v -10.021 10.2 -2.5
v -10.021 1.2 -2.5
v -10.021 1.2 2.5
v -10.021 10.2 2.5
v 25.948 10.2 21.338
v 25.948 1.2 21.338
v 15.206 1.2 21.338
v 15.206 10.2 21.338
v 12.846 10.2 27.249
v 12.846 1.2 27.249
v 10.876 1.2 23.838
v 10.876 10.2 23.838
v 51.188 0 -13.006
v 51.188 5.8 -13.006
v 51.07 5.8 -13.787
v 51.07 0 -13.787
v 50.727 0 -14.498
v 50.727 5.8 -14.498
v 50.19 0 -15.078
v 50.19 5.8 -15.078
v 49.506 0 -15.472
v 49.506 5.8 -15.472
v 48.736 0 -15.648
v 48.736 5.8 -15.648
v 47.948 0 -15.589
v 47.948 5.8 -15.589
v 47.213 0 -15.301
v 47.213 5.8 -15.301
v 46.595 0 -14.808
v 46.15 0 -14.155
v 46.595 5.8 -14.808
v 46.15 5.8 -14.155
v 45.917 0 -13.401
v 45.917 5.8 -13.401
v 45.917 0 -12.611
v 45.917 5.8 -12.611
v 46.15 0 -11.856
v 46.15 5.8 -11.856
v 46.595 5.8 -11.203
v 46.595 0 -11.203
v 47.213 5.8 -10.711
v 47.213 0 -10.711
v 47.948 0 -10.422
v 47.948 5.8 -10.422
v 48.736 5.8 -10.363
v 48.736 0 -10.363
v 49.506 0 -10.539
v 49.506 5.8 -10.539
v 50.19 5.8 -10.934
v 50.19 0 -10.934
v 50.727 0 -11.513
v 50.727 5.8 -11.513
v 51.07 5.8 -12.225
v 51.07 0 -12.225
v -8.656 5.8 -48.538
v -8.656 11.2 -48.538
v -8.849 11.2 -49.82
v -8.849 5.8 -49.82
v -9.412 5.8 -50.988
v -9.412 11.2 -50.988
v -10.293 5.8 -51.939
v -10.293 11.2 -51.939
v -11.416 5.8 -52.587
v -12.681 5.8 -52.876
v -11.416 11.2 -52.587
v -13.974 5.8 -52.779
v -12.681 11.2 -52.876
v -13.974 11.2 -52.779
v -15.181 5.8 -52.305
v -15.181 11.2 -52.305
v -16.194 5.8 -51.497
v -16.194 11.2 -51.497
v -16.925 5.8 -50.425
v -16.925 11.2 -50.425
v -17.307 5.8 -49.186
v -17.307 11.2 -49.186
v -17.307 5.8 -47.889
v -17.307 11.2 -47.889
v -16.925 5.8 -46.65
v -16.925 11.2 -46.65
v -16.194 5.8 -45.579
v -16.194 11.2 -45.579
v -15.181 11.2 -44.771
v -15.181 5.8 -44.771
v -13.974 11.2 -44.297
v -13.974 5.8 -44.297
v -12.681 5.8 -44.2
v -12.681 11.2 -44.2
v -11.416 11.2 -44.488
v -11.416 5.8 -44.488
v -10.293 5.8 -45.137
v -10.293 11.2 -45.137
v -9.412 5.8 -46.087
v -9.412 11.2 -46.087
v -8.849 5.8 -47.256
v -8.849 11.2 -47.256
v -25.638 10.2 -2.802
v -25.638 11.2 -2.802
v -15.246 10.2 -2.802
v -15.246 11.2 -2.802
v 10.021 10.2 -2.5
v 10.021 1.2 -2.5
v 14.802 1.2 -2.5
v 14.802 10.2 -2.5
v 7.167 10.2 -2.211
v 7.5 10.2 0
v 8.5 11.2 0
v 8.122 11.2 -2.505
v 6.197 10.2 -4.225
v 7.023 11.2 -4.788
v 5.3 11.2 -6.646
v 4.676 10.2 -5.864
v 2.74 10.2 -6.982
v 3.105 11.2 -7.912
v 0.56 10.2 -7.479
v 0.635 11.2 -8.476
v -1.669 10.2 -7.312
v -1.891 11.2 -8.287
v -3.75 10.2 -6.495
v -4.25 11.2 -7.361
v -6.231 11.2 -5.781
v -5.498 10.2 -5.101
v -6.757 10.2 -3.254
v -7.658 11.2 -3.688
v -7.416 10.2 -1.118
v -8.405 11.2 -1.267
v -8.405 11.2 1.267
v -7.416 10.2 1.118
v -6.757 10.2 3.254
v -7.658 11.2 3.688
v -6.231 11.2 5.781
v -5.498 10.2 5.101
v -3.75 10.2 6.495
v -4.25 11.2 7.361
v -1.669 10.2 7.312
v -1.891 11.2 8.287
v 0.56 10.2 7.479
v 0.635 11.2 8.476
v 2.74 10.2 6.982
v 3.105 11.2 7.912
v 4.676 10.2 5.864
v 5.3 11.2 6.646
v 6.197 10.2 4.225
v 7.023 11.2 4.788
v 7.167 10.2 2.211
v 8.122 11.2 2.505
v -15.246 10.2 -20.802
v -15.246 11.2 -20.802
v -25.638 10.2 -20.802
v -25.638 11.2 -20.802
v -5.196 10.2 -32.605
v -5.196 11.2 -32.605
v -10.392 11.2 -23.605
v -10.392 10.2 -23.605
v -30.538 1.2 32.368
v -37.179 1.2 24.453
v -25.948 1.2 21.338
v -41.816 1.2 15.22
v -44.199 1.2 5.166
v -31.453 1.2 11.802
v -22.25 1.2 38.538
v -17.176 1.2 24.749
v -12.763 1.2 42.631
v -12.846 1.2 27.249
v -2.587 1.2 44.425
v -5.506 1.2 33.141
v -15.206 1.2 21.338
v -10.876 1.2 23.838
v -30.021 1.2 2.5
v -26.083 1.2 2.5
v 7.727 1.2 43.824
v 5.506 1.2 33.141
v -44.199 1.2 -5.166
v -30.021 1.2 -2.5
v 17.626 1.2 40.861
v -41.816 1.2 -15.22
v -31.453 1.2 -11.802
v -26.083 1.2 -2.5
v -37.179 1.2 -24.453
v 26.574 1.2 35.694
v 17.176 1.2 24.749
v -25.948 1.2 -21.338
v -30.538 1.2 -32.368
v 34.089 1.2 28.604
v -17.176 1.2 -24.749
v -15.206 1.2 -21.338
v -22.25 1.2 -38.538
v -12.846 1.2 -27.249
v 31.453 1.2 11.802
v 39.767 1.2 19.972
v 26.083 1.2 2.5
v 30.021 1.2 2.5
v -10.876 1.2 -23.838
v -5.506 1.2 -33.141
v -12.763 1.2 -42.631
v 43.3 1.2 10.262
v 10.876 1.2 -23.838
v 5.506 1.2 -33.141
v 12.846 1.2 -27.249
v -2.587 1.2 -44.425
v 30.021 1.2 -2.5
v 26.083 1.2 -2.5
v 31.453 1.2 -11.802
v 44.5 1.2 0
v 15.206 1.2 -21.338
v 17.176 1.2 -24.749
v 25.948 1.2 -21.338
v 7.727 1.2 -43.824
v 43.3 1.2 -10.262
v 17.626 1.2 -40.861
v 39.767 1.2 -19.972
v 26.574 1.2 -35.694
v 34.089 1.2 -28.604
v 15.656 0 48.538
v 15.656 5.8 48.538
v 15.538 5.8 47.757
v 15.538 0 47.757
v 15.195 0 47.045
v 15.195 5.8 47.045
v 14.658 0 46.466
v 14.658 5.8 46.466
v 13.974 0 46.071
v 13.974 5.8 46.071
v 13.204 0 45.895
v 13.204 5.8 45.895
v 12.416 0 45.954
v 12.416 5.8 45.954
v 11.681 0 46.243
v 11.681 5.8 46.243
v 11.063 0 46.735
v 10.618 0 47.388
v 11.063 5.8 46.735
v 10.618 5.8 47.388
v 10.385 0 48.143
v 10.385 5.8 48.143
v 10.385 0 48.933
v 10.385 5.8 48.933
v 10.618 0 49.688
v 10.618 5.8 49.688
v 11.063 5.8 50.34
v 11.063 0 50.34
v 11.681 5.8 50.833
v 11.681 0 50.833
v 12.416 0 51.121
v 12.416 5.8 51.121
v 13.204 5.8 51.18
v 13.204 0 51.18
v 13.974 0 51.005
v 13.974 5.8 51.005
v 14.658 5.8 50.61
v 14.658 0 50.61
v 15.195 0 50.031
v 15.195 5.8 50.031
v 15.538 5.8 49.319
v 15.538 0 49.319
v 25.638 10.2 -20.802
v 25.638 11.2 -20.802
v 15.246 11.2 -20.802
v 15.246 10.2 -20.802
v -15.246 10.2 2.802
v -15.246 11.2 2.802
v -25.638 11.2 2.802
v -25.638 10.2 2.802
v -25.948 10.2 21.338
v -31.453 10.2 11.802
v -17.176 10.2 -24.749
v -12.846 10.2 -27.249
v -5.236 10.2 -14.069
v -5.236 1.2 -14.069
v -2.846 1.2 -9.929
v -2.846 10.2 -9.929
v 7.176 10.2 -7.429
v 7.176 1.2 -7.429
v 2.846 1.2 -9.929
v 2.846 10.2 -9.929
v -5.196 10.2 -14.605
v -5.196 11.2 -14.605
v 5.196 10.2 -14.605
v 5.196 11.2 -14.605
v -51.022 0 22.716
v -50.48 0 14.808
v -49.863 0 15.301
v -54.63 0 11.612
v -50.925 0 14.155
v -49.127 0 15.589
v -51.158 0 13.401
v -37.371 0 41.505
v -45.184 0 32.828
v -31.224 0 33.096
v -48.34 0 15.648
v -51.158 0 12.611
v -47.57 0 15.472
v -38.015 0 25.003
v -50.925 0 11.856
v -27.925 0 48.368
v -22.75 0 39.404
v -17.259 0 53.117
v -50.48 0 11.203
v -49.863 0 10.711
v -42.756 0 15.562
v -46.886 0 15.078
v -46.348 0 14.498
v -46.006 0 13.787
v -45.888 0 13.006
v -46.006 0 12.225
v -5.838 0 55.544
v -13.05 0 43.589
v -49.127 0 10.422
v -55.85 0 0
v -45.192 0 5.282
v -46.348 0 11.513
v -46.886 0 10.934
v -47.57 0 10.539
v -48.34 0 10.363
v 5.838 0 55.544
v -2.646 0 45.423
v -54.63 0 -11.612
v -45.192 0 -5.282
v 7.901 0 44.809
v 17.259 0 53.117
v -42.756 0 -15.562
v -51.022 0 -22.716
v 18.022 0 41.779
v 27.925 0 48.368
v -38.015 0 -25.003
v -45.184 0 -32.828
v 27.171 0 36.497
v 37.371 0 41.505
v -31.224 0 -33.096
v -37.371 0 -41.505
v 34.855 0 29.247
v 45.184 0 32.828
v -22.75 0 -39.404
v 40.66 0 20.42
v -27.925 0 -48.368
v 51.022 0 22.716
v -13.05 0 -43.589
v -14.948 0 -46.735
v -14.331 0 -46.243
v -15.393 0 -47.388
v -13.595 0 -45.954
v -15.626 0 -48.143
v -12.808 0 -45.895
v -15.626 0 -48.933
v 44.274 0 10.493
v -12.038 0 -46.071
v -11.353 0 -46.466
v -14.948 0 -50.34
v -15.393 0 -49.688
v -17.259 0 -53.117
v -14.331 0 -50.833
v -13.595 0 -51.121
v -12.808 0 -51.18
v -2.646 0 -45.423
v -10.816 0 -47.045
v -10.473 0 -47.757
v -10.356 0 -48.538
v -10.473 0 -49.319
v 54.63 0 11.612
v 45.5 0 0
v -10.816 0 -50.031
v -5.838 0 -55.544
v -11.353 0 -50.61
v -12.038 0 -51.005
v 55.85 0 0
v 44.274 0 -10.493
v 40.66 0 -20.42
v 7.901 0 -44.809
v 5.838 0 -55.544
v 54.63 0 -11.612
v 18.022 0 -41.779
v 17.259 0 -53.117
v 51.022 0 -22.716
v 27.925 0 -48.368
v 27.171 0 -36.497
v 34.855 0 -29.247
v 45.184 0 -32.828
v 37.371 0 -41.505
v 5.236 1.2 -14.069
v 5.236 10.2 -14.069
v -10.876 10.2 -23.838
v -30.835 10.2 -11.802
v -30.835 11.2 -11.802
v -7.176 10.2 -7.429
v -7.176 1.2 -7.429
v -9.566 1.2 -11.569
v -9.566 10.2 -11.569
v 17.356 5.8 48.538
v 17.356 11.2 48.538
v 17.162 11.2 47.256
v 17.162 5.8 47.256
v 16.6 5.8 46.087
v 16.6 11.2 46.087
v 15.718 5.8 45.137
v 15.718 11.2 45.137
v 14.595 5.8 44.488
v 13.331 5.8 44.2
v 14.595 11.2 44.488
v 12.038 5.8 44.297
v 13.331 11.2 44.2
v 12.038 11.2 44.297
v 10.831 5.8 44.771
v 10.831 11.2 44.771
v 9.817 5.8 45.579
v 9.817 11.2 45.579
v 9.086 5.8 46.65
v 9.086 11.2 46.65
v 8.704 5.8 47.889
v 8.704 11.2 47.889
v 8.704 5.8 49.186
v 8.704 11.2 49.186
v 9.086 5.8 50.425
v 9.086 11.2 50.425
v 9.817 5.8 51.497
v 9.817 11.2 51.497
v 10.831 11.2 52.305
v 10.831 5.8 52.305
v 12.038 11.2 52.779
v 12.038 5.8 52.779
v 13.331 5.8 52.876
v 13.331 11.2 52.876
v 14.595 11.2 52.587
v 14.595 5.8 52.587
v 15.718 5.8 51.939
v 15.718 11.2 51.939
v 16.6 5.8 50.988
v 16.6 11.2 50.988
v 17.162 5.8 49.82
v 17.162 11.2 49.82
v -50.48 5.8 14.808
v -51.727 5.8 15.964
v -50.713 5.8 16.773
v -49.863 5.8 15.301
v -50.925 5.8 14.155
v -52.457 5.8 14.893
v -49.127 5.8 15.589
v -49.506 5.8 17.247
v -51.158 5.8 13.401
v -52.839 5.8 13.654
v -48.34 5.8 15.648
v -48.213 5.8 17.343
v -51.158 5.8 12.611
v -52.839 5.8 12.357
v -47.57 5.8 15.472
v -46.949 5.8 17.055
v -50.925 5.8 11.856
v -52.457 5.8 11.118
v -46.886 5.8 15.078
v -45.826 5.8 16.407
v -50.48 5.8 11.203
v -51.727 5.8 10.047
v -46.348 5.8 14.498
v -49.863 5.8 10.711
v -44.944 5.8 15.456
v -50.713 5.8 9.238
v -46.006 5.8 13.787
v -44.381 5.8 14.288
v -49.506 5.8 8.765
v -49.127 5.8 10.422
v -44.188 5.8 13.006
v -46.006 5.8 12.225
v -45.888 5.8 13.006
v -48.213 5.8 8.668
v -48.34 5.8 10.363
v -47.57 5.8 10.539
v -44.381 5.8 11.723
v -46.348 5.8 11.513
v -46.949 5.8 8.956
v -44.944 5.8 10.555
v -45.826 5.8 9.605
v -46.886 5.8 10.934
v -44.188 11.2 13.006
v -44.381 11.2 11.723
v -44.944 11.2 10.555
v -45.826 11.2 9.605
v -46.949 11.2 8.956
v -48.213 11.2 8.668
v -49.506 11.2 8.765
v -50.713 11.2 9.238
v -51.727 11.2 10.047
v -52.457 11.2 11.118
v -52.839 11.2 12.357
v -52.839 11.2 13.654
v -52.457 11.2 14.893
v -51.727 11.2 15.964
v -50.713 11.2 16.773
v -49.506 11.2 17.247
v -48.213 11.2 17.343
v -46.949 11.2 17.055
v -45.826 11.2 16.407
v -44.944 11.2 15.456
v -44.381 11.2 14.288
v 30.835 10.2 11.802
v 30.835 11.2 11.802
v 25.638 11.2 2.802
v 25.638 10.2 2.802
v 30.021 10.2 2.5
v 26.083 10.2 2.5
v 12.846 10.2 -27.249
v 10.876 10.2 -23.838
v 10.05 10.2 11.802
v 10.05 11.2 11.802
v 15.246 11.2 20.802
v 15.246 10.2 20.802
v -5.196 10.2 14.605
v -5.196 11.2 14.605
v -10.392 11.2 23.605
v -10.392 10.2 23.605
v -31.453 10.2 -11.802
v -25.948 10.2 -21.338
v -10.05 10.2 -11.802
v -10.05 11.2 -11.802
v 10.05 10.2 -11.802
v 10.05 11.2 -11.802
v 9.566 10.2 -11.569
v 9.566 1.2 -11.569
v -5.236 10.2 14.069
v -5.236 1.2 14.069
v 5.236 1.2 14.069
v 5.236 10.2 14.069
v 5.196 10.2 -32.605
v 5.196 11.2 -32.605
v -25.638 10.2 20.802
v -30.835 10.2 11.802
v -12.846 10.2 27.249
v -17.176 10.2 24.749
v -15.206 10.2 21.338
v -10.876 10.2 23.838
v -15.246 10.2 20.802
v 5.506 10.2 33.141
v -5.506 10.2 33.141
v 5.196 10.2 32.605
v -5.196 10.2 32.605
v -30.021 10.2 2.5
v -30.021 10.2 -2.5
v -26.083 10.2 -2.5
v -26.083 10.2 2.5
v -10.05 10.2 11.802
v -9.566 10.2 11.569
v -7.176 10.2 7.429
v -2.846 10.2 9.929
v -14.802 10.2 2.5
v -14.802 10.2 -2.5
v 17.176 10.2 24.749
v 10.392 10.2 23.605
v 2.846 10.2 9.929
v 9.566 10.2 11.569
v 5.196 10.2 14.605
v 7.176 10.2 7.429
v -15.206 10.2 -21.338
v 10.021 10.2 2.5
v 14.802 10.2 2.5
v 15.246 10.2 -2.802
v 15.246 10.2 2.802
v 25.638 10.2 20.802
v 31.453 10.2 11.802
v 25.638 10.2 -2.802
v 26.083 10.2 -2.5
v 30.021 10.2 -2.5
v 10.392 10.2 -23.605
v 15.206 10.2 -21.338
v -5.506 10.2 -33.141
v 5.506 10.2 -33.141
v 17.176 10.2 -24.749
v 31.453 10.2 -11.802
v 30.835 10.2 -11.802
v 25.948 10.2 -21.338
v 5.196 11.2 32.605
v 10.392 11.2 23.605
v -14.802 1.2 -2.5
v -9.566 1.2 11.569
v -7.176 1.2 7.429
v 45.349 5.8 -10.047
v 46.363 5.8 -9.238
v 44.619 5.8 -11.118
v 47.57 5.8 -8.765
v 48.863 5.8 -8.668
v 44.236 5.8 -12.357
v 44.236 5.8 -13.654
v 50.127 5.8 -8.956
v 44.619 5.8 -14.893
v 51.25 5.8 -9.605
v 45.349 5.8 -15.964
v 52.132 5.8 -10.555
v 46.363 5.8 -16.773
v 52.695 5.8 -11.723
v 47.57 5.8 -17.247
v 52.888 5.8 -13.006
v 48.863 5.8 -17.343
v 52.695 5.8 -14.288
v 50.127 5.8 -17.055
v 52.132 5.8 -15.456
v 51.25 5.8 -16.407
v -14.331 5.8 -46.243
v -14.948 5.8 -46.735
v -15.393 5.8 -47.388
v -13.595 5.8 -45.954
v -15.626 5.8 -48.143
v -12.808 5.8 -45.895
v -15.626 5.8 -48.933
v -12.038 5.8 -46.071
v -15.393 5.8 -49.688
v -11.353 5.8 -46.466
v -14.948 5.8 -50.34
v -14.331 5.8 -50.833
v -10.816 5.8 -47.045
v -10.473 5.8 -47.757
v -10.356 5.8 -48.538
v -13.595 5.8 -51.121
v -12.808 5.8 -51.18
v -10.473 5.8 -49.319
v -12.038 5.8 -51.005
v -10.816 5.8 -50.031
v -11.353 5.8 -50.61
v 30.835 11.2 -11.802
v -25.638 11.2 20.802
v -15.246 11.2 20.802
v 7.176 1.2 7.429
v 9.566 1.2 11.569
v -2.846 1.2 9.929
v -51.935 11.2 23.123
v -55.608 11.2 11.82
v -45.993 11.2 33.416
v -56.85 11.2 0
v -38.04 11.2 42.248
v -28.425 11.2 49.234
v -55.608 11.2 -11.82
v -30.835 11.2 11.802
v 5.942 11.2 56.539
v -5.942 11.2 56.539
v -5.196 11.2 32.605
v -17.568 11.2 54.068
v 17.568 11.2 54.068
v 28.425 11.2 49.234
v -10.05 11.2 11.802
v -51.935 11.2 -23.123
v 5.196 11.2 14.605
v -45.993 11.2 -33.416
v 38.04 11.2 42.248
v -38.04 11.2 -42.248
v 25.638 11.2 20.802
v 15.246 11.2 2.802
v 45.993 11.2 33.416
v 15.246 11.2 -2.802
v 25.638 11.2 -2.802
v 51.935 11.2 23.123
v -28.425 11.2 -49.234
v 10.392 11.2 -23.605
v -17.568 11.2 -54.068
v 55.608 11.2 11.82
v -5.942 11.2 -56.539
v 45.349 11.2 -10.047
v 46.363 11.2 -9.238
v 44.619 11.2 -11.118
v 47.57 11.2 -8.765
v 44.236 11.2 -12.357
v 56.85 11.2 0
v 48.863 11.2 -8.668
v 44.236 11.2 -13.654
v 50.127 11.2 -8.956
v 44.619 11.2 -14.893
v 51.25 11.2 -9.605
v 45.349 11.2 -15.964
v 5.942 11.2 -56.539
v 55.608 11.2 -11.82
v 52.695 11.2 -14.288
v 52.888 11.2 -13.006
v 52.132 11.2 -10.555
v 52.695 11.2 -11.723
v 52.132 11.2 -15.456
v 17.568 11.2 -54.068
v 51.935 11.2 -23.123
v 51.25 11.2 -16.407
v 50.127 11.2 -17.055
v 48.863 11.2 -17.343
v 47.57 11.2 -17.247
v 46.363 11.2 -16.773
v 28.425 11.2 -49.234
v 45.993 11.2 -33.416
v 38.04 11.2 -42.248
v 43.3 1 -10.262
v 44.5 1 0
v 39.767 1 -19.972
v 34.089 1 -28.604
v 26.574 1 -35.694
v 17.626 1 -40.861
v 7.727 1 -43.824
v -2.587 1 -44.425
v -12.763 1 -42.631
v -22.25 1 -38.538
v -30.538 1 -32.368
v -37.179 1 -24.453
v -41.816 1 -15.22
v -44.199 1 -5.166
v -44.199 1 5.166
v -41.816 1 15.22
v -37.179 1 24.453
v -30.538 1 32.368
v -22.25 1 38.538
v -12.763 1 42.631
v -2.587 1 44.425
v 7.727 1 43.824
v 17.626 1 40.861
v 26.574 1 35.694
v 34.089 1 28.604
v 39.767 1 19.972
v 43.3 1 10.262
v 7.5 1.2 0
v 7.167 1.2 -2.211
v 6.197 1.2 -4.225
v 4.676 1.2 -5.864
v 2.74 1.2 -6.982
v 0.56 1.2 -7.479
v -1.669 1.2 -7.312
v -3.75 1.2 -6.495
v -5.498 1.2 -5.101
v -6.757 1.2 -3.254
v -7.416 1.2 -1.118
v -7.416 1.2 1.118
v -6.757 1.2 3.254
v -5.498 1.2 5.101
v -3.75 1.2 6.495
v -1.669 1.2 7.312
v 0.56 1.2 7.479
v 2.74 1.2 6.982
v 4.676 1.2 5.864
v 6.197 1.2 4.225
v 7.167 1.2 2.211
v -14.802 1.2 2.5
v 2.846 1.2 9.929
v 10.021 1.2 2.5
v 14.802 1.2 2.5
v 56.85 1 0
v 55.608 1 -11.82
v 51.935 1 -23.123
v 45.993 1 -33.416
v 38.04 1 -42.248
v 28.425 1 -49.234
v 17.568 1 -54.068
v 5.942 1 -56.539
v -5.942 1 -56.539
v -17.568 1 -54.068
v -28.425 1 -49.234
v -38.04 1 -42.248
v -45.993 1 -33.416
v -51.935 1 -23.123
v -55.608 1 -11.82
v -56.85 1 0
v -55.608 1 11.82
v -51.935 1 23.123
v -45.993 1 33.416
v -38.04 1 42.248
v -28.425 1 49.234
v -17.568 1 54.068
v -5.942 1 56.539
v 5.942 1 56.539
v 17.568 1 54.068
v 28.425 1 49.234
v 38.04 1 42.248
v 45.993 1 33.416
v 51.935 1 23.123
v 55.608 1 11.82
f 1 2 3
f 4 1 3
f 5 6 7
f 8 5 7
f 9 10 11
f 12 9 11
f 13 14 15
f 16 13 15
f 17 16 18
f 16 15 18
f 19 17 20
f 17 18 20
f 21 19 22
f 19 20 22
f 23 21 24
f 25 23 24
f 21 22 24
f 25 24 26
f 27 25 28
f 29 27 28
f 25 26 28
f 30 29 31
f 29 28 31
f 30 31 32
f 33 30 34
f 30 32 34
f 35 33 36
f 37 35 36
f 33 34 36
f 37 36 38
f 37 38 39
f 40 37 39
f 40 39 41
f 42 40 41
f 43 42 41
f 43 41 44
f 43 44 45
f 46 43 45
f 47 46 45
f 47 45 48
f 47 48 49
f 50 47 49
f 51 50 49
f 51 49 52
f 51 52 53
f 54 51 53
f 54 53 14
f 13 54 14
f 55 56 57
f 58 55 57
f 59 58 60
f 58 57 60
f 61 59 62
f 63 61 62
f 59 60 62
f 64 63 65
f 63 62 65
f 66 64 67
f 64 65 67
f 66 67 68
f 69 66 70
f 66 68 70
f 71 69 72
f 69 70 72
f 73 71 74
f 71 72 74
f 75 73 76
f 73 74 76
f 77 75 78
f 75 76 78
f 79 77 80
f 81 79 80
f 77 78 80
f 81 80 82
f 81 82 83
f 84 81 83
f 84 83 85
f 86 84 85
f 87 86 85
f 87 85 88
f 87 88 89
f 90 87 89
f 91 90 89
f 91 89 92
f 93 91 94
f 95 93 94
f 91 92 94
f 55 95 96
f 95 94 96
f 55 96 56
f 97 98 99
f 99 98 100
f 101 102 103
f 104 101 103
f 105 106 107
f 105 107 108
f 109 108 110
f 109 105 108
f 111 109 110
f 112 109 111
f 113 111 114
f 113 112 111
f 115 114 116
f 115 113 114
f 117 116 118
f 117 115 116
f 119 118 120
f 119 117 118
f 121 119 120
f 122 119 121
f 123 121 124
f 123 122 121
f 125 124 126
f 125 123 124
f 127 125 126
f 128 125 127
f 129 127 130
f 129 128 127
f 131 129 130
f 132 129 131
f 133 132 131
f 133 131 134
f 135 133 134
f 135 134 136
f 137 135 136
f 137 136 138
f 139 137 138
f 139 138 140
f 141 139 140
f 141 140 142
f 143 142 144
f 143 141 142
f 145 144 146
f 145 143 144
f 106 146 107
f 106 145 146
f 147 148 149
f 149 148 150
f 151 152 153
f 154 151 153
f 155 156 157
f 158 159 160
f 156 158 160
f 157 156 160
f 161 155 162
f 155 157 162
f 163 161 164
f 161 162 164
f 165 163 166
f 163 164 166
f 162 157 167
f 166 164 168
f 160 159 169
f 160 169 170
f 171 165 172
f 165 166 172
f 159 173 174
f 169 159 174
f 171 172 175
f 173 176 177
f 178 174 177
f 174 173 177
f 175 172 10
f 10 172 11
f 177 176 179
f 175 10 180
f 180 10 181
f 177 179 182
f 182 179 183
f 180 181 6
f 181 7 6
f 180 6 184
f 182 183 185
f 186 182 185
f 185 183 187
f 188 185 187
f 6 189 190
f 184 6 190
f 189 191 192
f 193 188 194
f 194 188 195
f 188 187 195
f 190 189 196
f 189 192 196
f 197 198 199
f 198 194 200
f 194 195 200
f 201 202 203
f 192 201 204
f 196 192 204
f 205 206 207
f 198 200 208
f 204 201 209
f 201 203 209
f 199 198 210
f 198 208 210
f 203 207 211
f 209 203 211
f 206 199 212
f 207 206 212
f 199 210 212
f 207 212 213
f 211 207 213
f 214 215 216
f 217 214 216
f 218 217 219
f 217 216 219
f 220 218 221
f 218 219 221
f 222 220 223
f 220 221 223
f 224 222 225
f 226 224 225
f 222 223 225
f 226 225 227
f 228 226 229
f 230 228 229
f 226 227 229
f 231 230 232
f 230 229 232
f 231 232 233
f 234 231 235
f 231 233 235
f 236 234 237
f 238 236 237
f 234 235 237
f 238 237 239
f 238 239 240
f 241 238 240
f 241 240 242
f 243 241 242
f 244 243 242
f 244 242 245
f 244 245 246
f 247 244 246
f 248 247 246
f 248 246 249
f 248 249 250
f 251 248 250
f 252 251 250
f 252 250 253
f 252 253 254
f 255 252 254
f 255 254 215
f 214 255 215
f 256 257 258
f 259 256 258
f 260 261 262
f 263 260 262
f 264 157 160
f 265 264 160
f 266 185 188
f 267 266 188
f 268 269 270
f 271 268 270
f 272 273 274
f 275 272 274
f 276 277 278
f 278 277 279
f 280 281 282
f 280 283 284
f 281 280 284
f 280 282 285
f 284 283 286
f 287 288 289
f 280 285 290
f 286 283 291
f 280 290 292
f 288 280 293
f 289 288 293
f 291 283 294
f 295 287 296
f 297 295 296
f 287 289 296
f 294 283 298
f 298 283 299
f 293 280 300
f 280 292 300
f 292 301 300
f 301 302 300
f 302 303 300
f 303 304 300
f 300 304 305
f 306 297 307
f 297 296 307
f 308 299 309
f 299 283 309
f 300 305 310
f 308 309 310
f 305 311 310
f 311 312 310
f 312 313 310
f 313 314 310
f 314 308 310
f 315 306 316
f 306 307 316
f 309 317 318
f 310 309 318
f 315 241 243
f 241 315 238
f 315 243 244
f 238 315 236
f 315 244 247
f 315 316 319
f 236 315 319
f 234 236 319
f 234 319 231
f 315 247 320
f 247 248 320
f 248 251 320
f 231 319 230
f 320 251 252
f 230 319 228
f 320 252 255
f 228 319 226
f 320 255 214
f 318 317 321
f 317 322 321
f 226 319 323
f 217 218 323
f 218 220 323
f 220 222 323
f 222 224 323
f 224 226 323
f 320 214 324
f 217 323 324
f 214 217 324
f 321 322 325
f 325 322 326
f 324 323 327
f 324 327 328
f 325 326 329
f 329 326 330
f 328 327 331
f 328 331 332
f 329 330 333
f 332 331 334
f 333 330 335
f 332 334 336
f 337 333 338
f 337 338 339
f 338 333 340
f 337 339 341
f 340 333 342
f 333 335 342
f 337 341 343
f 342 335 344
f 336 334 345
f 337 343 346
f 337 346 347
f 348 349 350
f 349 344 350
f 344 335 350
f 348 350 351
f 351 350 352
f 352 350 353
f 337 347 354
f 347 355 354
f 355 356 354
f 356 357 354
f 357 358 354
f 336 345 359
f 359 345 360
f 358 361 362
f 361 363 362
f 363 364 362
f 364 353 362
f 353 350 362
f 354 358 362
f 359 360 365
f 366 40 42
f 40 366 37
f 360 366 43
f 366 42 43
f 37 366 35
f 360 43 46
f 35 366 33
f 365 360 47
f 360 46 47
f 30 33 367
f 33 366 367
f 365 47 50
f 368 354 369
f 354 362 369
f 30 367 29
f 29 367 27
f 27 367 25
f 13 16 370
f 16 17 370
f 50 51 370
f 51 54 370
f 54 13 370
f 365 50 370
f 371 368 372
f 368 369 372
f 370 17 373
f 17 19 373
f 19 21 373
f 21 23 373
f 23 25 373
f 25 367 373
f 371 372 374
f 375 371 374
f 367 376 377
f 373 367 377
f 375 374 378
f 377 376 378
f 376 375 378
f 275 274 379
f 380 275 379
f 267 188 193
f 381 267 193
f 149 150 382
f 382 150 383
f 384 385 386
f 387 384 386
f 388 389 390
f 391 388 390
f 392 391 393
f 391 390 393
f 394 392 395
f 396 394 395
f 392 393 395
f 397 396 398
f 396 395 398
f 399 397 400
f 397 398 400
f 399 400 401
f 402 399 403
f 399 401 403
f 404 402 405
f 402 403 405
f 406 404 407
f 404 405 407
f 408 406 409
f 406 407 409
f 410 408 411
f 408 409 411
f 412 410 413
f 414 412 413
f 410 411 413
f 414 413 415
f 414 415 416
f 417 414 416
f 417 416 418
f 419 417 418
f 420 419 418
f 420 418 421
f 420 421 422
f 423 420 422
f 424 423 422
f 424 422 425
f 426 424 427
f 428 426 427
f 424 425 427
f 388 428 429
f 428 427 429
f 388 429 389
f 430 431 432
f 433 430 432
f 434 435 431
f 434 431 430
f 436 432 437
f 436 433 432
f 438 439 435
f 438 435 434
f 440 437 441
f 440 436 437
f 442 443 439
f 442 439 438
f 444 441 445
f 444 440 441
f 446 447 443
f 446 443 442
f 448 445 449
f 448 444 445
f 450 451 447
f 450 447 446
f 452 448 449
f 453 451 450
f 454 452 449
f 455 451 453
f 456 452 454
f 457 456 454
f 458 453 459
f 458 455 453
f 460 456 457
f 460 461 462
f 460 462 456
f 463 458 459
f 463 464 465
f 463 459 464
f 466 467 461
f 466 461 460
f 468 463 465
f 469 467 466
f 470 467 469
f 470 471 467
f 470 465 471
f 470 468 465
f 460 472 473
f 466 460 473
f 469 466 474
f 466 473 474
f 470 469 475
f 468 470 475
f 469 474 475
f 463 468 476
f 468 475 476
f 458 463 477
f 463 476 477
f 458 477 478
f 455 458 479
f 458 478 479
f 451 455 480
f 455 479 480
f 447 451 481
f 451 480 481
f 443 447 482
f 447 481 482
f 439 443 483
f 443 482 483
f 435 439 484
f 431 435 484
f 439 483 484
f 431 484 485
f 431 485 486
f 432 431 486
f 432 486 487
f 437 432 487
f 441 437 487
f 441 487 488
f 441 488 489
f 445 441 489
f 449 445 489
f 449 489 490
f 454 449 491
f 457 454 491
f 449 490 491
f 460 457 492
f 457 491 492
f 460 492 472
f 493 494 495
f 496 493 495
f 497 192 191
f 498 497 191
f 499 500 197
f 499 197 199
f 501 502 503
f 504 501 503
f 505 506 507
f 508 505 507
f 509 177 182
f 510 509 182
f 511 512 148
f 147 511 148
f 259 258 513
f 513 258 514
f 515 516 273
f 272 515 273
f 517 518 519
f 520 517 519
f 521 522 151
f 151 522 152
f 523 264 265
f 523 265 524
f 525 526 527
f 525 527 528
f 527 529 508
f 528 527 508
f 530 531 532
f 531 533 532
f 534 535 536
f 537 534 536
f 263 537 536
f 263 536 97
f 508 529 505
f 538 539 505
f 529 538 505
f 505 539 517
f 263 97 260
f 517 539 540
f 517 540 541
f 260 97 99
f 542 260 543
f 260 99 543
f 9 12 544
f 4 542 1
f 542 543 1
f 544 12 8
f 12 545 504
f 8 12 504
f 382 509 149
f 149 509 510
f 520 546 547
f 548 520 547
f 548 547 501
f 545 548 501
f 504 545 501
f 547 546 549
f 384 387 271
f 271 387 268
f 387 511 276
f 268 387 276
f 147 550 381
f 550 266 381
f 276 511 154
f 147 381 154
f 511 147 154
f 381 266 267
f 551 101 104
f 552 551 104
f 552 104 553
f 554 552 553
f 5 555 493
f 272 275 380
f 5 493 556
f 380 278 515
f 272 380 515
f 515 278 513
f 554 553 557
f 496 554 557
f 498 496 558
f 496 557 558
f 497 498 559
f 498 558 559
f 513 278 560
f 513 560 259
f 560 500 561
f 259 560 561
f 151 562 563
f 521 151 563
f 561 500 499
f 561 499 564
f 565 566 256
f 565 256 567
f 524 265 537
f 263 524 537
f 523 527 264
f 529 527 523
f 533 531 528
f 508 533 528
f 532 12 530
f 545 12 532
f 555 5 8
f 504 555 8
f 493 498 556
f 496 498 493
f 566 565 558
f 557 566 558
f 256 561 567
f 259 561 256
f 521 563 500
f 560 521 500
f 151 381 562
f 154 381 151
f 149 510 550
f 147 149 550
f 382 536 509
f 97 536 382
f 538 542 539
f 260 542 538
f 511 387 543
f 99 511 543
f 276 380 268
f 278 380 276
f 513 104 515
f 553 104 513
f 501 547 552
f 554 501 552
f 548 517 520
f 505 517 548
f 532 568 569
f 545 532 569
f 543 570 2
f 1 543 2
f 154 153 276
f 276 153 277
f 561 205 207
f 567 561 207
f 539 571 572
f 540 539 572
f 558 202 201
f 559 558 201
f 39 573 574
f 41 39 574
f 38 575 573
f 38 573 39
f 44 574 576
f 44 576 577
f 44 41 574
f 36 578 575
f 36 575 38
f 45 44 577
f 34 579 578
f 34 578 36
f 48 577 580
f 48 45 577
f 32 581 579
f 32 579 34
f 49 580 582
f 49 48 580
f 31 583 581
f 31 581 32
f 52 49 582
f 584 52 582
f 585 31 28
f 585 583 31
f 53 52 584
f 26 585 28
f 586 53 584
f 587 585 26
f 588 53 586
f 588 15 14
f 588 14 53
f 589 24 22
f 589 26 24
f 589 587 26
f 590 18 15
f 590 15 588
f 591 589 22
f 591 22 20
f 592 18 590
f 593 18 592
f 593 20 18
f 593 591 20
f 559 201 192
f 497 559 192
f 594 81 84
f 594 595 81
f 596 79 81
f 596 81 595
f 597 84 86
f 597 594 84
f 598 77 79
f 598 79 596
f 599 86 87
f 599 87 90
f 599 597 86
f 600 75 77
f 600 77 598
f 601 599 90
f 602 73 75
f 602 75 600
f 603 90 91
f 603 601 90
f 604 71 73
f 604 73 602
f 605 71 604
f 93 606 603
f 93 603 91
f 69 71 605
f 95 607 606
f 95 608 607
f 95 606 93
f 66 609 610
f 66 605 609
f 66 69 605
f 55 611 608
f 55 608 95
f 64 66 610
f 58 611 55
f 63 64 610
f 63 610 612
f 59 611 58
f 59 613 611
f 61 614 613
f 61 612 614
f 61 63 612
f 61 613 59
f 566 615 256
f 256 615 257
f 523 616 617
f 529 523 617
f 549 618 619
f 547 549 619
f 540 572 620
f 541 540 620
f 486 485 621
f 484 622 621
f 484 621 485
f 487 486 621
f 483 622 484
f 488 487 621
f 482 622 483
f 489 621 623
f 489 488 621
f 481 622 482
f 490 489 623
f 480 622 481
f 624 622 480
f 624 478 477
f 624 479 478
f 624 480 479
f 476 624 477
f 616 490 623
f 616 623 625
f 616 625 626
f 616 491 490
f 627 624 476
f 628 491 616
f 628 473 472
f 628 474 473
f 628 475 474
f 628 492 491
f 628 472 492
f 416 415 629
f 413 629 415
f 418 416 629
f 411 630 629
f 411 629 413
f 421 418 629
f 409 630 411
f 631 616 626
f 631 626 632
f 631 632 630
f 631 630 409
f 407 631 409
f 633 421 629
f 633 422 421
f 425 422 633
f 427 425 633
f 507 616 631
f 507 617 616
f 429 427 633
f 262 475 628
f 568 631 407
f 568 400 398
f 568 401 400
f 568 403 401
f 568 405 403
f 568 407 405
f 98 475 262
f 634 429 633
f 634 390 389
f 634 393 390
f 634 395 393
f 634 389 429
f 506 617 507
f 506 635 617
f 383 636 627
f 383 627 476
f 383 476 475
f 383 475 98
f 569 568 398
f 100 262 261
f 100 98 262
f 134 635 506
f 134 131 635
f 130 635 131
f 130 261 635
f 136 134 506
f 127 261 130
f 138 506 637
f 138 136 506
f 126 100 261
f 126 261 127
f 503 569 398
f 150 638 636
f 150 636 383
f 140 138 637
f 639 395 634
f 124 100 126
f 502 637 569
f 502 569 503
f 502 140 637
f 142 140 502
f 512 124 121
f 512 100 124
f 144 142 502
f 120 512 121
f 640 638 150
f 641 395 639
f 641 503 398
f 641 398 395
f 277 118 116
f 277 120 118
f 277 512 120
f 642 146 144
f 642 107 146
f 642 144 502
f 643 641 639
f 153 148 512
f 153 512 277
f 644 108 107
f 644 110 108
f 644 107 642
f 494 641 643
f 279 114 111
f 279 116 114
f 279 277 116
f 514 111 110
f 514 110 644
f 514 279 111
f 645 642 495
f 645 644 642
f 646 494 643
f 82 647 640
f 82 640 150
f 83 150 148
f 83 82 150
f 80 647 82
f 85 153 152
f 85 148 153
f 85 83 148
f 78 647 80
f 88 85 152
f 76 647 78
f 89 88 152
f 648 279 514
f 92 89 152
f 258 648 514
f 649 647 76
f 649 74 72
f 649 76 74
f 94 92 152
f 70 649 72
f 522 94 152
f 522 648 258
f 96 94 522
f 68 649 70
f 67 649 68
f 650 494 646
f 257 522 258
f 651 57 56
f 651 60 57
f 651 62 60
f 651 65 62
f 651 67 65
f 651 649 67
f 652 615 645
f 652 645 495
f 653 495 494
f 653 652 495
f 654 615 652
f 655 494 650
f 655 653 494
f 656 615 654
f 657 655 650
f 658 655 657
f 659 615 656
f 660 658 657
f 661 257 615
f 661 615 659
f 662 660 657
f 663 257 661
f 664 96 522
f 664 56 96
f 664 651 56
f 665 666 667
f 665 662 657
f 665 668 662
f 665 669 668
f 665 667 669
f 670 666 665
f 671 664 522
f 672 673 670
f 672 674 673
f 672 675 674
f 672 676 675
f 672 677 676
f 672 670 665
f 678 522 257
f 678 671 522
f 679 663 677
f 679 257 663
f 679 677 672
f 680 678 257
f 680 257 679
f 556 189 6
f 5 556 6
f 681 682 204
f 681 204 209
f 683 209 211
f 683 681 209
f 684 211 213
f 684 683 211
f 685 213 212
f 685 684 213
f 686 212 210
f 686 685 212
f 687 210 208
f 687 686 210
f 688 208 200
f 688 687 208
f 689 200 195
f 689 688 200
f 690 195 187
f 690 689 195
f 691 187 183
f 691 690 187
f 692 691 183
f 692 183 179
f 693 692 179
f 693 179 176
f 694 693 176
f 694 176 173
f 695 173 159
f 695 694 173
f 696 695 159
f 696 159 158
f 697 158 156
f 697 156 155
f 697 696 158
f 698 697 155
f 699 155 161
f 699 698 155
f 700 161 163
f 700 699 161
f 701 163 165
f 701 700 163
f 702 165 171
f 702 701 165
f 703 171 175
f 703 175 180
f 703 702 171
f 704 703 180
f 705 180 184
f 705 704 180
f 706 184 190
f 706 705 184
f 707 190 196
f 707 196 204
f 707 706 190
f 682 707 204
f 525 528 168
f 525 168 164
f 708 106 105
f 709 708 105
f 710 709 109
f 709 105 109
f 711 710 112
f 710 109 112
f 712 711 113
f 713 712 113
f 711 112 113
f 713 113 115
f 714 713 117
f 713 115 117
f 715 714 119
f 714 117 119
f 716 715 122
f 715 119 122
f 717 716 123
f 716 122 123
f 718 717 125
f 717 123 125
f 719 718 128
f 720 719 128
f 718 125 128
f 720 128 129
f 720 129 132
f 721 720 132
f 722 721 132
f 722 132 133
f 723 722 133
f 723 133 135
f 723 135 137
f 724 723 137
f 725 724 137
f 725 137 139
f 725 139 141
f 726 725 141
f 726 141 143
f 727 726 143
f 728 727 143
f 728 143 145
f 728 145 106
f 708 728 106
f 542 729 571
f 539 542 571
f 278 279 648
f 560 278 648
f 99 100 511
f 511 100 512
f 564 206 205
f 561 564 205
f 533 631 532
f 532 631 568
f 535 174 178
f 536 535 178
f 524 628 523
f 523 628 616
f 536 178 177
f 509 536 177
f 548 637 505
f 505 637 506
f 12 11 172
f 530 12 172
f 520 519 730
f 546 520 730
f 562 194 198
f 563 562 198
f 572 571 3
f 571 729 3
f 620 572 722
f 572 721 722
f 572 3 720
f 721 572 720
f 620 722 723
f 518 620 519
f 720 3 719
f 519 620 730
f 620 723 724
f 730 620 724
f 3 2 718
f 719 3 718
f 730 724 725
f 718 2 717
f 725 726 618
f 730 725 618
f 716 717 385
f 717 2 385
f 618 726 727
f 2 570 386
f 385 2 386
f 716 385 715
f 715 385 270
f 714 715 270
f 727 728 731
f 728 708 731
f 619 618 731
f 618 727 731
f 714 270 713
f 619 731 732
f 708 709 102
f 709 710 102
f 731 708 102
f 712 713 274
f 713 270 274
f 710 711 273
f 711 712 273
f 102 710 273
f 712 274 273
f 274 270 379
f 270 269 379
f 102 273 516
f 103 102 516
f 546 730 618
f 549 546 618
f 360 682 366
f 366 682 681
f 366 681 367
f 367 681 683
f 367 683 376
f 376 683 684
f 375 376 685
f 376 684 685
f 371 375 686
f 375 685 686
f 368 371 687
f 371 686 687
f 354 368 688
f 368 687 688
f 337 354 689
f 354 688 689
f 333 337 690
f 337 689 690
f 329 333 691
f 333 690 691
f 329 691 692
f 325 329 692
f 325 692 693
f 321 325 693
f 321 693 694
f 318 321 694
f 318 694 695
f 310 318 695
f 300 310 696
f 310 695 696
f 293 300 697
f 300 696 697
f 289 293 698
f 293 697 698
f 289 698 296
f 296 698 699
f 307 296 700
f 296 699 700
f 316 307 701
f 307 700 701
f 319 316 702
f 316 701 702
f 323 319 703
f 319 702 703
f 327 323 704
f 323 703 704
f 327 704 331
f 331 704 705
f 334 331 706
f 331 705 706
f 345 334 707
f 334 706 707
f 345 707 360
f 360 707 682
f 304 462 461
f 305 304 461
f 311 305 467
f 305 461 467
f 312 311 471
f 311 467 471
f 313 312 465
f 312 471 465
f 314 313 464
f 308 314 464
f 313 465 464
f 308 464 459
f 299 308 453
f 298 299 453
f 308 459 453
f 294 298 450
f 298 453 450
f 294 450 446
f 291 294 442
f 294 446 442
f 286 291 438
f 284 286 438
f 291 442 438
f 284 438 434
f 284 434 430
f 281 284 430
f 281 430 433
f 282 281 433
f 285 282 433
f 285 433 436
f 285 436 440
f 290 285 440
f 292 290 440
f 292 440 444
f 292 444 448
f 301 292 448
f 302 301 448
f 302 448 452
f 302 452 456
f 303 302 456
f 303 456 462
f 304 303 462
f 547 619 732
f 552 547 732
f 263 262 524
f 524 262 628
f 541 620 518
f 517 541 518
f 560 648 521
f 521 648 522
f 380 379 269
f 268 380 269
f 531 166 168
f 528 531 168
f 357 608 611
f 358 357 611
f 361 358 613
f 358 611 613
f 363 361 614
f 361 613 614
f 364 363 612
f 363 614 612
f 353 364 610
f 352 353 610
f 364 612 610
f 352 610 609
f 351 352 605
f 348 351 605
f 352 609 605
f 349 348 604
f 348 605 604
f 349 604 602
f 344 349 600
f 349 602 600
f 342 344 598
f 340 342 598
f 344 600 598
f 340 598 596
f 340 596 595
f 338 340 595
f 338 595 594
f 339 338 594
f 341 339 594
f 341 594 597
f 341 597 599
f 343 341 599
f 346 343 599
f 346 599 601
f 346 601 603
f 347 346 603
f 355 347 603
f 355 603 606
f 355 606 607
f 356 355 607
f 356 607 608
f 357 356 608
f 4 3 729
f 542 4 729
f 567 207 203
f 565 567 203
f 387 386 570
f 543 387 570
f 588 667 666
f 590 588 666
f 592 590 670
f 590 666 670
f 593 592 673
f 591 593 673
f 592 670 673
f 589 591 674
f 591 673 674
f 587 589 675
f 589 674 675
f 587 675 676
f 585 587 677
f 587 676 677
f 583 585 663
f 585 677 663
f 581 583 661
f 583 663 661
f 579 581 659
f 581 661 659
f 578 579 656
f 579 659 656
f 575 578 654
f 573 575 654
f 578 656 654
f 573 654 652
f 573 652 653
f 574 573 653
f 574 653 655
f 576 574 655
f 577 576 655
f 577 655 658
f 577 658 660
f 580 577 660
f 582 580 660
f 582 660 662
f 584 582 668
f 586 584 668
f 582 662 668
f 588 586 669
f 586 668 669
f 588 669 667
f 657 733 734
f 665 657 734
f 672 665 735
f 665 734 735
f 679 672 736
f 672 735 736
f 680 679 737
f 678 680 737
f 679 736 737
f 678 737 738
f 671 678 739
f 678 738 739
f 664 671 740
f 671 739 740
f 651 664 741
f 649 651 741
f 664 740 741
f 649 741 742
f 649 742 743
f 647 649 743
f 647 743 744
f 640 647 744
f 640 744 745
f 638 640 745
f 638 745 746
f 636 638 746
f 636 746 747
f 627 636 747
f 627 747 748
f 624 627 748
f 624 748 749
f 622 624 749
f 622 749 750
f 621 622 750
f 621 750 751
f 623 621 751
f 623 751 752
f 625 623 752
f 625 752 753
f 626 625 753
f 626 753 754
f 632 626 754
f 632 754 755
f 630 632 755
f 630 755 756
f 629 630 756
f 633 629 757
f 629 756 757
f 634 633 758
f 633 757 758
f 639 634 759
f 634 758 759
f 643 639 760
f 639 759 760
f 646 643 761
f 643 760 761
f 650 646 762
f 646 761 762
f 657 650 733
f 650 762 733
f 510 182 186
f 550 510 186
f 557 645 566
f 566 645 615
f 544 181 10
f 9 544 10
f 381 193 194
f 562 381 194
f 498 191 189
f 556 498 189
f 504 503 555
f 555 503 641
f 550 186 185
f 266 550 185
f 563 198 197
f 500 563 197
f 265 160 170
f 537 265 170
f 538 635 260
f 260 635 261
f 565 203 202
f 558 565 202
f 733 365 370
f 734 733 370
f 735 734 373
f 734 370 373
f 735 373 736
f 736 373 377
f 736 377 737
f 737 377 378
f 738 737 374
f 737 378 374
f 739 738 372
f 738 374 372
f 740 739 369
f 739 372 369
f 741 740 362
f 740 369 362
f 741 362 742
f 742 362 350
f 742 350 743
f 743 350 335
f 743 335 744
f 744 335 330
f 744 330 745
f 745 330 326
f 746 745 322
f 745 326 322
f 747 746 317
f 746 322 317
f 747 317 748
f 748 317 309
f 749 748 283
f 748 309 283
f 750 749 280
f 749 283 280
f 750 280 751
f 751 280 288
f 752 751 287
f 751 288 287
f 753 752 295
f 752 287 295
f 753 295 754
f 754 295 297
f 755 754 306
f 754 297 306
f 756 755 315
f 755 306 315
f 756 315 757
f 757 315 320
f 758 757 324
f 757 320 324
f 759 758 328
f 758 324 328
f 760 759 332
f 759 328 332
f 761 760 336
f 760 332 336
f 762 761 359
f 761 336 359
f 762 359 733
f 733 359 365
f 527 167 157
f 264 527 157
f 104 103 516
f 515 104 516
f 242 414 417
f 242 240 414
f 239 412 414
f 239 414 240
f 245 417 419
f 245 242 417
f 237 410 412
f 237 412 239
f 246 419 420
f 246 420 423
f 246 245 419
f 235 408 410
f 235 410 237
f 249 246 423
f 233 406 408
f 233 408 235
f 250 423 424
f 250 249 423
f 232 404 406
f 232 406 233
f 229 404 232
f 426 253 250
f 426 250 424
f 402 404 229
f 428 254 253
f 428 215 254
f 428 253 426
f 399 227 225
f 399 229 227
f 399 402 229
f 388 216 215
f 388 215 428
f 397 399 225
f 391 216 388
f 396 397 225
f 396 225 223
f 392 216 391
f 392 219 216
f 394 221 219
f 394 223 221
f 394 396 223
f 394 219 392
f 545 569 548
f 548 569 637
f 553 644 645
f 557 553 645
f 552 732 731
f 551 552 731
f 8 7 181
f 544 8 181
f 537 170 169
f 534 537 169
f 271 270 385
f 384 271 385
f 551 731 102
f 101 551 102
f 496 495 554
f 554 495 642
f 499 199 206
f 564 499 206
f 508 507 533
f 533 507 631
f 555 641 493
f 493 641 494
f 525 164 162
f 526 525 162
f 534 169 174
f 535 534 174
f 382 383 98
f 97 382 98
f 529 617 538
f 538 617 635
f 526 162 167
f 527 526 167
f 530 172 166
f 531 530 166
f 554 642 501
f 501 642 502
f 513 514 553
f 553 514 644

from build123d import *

# Parameters (mm, degrees)
SKETCH2_R           = 56.85
SKETCH2_R_2         = 44.5
BOSS_EXTRUDE1_DEPTH = 1.2
SKETCH3_R           = 56.85
BOSS_EXTRUDE2_DEPTH = 10
SKETCH4_R           = 2.65
CUT_EXTRUDE1_DEPTH  = 12.2
SKETCH5_R           = 7.5
CUT_EXTRUDE2_DEPTH  = 12.2
CUT_EXTRUDE4_DEPTH  = 11
SKETCH7_W           = 20
SKETCH7_H           = 5
BOSS_EXTRUDE3_DEPTH = 1
BOSS_EXTRUDE4_DEPTH = 1
CIRPATTERN1_COUNT   = 6
SKETCH9_R           = 4.35
CUT_EXTRUDE5_DEPTH  = 5.4
CHAMFER1_SIZE       = 1
CHAMFER2_SIZE       = 1


with BuildPart() as part:
    # Sketch2 → Boss-Extrude1 (new body)
    with BuildSketch(Plane(origin=(0, 0, 0), x_dir=(1, 0, 0), z_dir=(0, 1, 0))):
        Circle(SKETCH2_R)
        Circle(SKETCH2_R_2, mode=Mode.SUBTRACT)
    extrude(amount=BOSS_EXTRUDE1_DEPTH)

    # Sketch3 → Boss-Extrude2 (add)
    with BuildSketch(Plane(origin=(0, 1.2, 0), x_dir=(1, 0, 0), z_dir=(0, 1, 0))):
        Circle(SKETCH3_R)
    extrude(amount=BOSS_EXTRUDE2_DEPTH)

    # Sketch4 → Cut-Extrude1 (cut, through all)
    with BuildSketch(Plane(origin=(0, 11.2, 0), x_dir=(1, 0, 0), z_dir=(0, 1, 0))):
        with Locations((-13.005657016, 48.537772771)):
            Circle(SKETCH4_R)
        with Locations((48.537772771, 13.005657016)):
            Circle(SKETCH4_R)
        with Locations((13.005657016, -48.537772771)):
            Circle(SKETCH4_R)
        with Locations((-48.537772771, -13.005657016)):
            Circle(SKETCH4_R)
    extrude(amount=-CUT_EXTRUDE1_DEPTH, mode=Mode.SUBTRACT)

    # Sketch5 → Cut-Extrude2 (cut, through all)
    with BuildSketch(Plane(origin=(0, 11.2, 0), x_dir=(1, 0, 0), z_dir=(0, 1, 0))):
        Circle(SKETCH5_R)
    extrude(amount=-CUT_EXTRUDE2_DEPTH, mode=Mode.SUBTRACT)

    # Sketch6 → Cut-Extrude4 (cut, through all)
    with BuildSketch(Plane.XZ.offset(-1.2)):
        Polygon((12.845675931, 27.249363369), (10.876265015, 23.838243602), (5.505548638, 33.14059724), (-5.505548638, 33.14059724), (-10.876265015, 23.838243603), (-12.845675931, 27.249363369), (-17.175802949, 24.749363369), (-15.206392034, 21.338243603), (-25.947824787, 21.338243603), (-31.453373426, 11.802353637), (-26.082657049, 2.5), (-30.02147888, 2.5), (-30.02147888, -2.5), (-26.082657049, -2.5), (-31.453373426, -11.802353638), (-25.947824787, -21.338243603), (-15.206392034, -21.338243603), (-17.175802949, -24.749363369), (-12.845675931, -27.249363369), (-10.876265015, -23.838243603), (-5.505548638, -33.14059724), (5.505548638, -33.14059724), (10.876265015, -23.838243603), (12.845675931, -27.249363369), (17.175802949, -24.749363369), (15.206392034, -21.338243603), (25.947824787, -21.338243603), (31.453373426, -11.802353638), (26.082657049, -2.5), (30.02147888, -2.5), (30.02147888, 2.5), (26.082657049, 2.5), (31.453373426, 11.802353637), (25.947824787, 21.338243602), (15.206392034, 21.338243602), (17.175802949, 24.749363369), align=None)
        Polygon((-2.845675931, 9.928855294), (-5.235884115, 14.06881731), (5.235884115, 14.06881731), (2.845675931, 9.928855294), (7.175802949, 7.428855294), (9.566011134, 11.56881731), (14.801895249, 2.5), (10.02147888, 2.5), (10.02147888, -2.5), (14.801895249, -2.5), (9.566011134, -11.56881731), (7.175802949, -7.428855294), (2.845675931, -9.928855294), (5.235884115, -14.06881731), (-5.235884115, -14.06881731), (-2.845675931, -9.928855294), (-7.175802949, -7.428855294), (-9.566011134, -11.56881731), (-14.801895249, -2.5), (-10.02147888, -2.5), (-10.02147888, 2.5), (-14.801895249, 2.5), (-9.566011134, 11.56881731), (-7.175802949, 7.428855294), align=None, mode=Mode.SUBTRACT)
    extrude(amount=-CUT_EXTRUDE4_DEPTH, mode=Mode.SUBTRACT)

    # Sketch7 → Boss-Extrude3 (add)
    with BuildSketch(Plane(origin=(0, 11.2, 0), x_dir=(1, 0, 0), z_dir=(0, 1, 0))):
        Polygon((-17.175802949, 24.749363369), (-7.175802949, 7.428855294), (-2.845675931, 9.928855294), (-12.845675931, 27.249363369), align=None)
        Polygon((17.175802949, 24.749363369), (12.845675931, 27.249363369), (2.845675931, 9.928855294), (7.175802949, 7.428855294), align=None)
        with Locations((20.02147888, 0)):
            Rectangle(SKETCH7_W, SKETCH7_H)
        Polygon((12.845675931, -27.249363369), (17.175802949, -24.749363369), (7.175802949, -7.428855294), (2.845675931, -9.928855294), align=None)
        Polygon((-17.175802949, -24.749363369), (-12.845675931, -27.249363369), (-2.845675931, -9.928855294), (-7.175802949, -7.428855294), align=None)
        with Locations((-20.02147888, 0)):
            Rectangle(SKETCH7_W, SKETCH7_H)
    extrude(amount=-BOSS_EXTRUDE3_DEPTH)

    # Sketch8 → Boss-Extrude4 (add)
    with BuildSketch(Plane(origin=(0, 11.2, 0), x_dir=(1, 0, 0), z_dir=(0, 1, 0))):
        Polygon((5.542562584, -14.00470728), (-5.542562584, -14.00470728), (-11.085125168, -23.60470728), (-5.542562584, -33.20470728), (5.542562584, -33.20470728), (11.085125168, -23.60470728), align=None)
        Polygon((5.196152423, -14.60470728), (-5.196152423, -14.60470728), (-10.392304845, -23.60470728), (-5.196152423, -32.60470728), (5.196152423, -32.60470728), (10.392304845, -23.60470728), align=None, mode=Mode.SUBTRACT)
    boss_extrude4 = extrude(amount=-BOSS_EXTRUDE4_DEPTH)

    # CirPattern1: Boss-Extrude4 ×6 about axis
    cirpattern1_axis = Axis((0, 0, 0), (0, 1, 0))
    for i in range(1, CIRPATTERN1_COUNT):
        add(boss_extrude4.rotate(cirpattern1_axis, i * 360 / CIRPATTERN1_COUNT))

    # Sketch9 → Cut-Extrude5 (cut)
    with BuildSketch(Plane(origin=(0, 11.2, 0), x_dir=(1, 0, 0), z_dir=(0, 1, 0))):
        with Locations((-13.005657016, 48.537772771)):
            Circle(SKETCH9_R)
        with Locations((48.537772771, 13.005657016)):
            Circle(SKETCH9_R)
        with Locations((13.005657016, -48.537772771)):
            Circle(SKETCH9_R)
        with Locations((-48.537772771, -13.005657016)):
            Circle(SKETCH9_R)
    extrude(amount=-CUT_EXTRUDE5_DEPTH, mode=Mode.SUBTRACT)

    # Chamfer1
    chamfer1_edges = [part.edges().sort_by_distance(p)[0] for p in [
        (-44.5, 0, 0),
        (-56.85, 0, 0),
    ]]
    chamfer(chamfer1_edges, length=CHAMFER1_SIZE)

    # Chamfer2
    chamfer2_edges = [part.edges().sort_by_distance(p)[0] for p in [
        (-7.5, 11.2, 0),
    ]]
    chamfer(chamfer2_edges, length=CHAMFER2_SIZE)


solid = part.part
